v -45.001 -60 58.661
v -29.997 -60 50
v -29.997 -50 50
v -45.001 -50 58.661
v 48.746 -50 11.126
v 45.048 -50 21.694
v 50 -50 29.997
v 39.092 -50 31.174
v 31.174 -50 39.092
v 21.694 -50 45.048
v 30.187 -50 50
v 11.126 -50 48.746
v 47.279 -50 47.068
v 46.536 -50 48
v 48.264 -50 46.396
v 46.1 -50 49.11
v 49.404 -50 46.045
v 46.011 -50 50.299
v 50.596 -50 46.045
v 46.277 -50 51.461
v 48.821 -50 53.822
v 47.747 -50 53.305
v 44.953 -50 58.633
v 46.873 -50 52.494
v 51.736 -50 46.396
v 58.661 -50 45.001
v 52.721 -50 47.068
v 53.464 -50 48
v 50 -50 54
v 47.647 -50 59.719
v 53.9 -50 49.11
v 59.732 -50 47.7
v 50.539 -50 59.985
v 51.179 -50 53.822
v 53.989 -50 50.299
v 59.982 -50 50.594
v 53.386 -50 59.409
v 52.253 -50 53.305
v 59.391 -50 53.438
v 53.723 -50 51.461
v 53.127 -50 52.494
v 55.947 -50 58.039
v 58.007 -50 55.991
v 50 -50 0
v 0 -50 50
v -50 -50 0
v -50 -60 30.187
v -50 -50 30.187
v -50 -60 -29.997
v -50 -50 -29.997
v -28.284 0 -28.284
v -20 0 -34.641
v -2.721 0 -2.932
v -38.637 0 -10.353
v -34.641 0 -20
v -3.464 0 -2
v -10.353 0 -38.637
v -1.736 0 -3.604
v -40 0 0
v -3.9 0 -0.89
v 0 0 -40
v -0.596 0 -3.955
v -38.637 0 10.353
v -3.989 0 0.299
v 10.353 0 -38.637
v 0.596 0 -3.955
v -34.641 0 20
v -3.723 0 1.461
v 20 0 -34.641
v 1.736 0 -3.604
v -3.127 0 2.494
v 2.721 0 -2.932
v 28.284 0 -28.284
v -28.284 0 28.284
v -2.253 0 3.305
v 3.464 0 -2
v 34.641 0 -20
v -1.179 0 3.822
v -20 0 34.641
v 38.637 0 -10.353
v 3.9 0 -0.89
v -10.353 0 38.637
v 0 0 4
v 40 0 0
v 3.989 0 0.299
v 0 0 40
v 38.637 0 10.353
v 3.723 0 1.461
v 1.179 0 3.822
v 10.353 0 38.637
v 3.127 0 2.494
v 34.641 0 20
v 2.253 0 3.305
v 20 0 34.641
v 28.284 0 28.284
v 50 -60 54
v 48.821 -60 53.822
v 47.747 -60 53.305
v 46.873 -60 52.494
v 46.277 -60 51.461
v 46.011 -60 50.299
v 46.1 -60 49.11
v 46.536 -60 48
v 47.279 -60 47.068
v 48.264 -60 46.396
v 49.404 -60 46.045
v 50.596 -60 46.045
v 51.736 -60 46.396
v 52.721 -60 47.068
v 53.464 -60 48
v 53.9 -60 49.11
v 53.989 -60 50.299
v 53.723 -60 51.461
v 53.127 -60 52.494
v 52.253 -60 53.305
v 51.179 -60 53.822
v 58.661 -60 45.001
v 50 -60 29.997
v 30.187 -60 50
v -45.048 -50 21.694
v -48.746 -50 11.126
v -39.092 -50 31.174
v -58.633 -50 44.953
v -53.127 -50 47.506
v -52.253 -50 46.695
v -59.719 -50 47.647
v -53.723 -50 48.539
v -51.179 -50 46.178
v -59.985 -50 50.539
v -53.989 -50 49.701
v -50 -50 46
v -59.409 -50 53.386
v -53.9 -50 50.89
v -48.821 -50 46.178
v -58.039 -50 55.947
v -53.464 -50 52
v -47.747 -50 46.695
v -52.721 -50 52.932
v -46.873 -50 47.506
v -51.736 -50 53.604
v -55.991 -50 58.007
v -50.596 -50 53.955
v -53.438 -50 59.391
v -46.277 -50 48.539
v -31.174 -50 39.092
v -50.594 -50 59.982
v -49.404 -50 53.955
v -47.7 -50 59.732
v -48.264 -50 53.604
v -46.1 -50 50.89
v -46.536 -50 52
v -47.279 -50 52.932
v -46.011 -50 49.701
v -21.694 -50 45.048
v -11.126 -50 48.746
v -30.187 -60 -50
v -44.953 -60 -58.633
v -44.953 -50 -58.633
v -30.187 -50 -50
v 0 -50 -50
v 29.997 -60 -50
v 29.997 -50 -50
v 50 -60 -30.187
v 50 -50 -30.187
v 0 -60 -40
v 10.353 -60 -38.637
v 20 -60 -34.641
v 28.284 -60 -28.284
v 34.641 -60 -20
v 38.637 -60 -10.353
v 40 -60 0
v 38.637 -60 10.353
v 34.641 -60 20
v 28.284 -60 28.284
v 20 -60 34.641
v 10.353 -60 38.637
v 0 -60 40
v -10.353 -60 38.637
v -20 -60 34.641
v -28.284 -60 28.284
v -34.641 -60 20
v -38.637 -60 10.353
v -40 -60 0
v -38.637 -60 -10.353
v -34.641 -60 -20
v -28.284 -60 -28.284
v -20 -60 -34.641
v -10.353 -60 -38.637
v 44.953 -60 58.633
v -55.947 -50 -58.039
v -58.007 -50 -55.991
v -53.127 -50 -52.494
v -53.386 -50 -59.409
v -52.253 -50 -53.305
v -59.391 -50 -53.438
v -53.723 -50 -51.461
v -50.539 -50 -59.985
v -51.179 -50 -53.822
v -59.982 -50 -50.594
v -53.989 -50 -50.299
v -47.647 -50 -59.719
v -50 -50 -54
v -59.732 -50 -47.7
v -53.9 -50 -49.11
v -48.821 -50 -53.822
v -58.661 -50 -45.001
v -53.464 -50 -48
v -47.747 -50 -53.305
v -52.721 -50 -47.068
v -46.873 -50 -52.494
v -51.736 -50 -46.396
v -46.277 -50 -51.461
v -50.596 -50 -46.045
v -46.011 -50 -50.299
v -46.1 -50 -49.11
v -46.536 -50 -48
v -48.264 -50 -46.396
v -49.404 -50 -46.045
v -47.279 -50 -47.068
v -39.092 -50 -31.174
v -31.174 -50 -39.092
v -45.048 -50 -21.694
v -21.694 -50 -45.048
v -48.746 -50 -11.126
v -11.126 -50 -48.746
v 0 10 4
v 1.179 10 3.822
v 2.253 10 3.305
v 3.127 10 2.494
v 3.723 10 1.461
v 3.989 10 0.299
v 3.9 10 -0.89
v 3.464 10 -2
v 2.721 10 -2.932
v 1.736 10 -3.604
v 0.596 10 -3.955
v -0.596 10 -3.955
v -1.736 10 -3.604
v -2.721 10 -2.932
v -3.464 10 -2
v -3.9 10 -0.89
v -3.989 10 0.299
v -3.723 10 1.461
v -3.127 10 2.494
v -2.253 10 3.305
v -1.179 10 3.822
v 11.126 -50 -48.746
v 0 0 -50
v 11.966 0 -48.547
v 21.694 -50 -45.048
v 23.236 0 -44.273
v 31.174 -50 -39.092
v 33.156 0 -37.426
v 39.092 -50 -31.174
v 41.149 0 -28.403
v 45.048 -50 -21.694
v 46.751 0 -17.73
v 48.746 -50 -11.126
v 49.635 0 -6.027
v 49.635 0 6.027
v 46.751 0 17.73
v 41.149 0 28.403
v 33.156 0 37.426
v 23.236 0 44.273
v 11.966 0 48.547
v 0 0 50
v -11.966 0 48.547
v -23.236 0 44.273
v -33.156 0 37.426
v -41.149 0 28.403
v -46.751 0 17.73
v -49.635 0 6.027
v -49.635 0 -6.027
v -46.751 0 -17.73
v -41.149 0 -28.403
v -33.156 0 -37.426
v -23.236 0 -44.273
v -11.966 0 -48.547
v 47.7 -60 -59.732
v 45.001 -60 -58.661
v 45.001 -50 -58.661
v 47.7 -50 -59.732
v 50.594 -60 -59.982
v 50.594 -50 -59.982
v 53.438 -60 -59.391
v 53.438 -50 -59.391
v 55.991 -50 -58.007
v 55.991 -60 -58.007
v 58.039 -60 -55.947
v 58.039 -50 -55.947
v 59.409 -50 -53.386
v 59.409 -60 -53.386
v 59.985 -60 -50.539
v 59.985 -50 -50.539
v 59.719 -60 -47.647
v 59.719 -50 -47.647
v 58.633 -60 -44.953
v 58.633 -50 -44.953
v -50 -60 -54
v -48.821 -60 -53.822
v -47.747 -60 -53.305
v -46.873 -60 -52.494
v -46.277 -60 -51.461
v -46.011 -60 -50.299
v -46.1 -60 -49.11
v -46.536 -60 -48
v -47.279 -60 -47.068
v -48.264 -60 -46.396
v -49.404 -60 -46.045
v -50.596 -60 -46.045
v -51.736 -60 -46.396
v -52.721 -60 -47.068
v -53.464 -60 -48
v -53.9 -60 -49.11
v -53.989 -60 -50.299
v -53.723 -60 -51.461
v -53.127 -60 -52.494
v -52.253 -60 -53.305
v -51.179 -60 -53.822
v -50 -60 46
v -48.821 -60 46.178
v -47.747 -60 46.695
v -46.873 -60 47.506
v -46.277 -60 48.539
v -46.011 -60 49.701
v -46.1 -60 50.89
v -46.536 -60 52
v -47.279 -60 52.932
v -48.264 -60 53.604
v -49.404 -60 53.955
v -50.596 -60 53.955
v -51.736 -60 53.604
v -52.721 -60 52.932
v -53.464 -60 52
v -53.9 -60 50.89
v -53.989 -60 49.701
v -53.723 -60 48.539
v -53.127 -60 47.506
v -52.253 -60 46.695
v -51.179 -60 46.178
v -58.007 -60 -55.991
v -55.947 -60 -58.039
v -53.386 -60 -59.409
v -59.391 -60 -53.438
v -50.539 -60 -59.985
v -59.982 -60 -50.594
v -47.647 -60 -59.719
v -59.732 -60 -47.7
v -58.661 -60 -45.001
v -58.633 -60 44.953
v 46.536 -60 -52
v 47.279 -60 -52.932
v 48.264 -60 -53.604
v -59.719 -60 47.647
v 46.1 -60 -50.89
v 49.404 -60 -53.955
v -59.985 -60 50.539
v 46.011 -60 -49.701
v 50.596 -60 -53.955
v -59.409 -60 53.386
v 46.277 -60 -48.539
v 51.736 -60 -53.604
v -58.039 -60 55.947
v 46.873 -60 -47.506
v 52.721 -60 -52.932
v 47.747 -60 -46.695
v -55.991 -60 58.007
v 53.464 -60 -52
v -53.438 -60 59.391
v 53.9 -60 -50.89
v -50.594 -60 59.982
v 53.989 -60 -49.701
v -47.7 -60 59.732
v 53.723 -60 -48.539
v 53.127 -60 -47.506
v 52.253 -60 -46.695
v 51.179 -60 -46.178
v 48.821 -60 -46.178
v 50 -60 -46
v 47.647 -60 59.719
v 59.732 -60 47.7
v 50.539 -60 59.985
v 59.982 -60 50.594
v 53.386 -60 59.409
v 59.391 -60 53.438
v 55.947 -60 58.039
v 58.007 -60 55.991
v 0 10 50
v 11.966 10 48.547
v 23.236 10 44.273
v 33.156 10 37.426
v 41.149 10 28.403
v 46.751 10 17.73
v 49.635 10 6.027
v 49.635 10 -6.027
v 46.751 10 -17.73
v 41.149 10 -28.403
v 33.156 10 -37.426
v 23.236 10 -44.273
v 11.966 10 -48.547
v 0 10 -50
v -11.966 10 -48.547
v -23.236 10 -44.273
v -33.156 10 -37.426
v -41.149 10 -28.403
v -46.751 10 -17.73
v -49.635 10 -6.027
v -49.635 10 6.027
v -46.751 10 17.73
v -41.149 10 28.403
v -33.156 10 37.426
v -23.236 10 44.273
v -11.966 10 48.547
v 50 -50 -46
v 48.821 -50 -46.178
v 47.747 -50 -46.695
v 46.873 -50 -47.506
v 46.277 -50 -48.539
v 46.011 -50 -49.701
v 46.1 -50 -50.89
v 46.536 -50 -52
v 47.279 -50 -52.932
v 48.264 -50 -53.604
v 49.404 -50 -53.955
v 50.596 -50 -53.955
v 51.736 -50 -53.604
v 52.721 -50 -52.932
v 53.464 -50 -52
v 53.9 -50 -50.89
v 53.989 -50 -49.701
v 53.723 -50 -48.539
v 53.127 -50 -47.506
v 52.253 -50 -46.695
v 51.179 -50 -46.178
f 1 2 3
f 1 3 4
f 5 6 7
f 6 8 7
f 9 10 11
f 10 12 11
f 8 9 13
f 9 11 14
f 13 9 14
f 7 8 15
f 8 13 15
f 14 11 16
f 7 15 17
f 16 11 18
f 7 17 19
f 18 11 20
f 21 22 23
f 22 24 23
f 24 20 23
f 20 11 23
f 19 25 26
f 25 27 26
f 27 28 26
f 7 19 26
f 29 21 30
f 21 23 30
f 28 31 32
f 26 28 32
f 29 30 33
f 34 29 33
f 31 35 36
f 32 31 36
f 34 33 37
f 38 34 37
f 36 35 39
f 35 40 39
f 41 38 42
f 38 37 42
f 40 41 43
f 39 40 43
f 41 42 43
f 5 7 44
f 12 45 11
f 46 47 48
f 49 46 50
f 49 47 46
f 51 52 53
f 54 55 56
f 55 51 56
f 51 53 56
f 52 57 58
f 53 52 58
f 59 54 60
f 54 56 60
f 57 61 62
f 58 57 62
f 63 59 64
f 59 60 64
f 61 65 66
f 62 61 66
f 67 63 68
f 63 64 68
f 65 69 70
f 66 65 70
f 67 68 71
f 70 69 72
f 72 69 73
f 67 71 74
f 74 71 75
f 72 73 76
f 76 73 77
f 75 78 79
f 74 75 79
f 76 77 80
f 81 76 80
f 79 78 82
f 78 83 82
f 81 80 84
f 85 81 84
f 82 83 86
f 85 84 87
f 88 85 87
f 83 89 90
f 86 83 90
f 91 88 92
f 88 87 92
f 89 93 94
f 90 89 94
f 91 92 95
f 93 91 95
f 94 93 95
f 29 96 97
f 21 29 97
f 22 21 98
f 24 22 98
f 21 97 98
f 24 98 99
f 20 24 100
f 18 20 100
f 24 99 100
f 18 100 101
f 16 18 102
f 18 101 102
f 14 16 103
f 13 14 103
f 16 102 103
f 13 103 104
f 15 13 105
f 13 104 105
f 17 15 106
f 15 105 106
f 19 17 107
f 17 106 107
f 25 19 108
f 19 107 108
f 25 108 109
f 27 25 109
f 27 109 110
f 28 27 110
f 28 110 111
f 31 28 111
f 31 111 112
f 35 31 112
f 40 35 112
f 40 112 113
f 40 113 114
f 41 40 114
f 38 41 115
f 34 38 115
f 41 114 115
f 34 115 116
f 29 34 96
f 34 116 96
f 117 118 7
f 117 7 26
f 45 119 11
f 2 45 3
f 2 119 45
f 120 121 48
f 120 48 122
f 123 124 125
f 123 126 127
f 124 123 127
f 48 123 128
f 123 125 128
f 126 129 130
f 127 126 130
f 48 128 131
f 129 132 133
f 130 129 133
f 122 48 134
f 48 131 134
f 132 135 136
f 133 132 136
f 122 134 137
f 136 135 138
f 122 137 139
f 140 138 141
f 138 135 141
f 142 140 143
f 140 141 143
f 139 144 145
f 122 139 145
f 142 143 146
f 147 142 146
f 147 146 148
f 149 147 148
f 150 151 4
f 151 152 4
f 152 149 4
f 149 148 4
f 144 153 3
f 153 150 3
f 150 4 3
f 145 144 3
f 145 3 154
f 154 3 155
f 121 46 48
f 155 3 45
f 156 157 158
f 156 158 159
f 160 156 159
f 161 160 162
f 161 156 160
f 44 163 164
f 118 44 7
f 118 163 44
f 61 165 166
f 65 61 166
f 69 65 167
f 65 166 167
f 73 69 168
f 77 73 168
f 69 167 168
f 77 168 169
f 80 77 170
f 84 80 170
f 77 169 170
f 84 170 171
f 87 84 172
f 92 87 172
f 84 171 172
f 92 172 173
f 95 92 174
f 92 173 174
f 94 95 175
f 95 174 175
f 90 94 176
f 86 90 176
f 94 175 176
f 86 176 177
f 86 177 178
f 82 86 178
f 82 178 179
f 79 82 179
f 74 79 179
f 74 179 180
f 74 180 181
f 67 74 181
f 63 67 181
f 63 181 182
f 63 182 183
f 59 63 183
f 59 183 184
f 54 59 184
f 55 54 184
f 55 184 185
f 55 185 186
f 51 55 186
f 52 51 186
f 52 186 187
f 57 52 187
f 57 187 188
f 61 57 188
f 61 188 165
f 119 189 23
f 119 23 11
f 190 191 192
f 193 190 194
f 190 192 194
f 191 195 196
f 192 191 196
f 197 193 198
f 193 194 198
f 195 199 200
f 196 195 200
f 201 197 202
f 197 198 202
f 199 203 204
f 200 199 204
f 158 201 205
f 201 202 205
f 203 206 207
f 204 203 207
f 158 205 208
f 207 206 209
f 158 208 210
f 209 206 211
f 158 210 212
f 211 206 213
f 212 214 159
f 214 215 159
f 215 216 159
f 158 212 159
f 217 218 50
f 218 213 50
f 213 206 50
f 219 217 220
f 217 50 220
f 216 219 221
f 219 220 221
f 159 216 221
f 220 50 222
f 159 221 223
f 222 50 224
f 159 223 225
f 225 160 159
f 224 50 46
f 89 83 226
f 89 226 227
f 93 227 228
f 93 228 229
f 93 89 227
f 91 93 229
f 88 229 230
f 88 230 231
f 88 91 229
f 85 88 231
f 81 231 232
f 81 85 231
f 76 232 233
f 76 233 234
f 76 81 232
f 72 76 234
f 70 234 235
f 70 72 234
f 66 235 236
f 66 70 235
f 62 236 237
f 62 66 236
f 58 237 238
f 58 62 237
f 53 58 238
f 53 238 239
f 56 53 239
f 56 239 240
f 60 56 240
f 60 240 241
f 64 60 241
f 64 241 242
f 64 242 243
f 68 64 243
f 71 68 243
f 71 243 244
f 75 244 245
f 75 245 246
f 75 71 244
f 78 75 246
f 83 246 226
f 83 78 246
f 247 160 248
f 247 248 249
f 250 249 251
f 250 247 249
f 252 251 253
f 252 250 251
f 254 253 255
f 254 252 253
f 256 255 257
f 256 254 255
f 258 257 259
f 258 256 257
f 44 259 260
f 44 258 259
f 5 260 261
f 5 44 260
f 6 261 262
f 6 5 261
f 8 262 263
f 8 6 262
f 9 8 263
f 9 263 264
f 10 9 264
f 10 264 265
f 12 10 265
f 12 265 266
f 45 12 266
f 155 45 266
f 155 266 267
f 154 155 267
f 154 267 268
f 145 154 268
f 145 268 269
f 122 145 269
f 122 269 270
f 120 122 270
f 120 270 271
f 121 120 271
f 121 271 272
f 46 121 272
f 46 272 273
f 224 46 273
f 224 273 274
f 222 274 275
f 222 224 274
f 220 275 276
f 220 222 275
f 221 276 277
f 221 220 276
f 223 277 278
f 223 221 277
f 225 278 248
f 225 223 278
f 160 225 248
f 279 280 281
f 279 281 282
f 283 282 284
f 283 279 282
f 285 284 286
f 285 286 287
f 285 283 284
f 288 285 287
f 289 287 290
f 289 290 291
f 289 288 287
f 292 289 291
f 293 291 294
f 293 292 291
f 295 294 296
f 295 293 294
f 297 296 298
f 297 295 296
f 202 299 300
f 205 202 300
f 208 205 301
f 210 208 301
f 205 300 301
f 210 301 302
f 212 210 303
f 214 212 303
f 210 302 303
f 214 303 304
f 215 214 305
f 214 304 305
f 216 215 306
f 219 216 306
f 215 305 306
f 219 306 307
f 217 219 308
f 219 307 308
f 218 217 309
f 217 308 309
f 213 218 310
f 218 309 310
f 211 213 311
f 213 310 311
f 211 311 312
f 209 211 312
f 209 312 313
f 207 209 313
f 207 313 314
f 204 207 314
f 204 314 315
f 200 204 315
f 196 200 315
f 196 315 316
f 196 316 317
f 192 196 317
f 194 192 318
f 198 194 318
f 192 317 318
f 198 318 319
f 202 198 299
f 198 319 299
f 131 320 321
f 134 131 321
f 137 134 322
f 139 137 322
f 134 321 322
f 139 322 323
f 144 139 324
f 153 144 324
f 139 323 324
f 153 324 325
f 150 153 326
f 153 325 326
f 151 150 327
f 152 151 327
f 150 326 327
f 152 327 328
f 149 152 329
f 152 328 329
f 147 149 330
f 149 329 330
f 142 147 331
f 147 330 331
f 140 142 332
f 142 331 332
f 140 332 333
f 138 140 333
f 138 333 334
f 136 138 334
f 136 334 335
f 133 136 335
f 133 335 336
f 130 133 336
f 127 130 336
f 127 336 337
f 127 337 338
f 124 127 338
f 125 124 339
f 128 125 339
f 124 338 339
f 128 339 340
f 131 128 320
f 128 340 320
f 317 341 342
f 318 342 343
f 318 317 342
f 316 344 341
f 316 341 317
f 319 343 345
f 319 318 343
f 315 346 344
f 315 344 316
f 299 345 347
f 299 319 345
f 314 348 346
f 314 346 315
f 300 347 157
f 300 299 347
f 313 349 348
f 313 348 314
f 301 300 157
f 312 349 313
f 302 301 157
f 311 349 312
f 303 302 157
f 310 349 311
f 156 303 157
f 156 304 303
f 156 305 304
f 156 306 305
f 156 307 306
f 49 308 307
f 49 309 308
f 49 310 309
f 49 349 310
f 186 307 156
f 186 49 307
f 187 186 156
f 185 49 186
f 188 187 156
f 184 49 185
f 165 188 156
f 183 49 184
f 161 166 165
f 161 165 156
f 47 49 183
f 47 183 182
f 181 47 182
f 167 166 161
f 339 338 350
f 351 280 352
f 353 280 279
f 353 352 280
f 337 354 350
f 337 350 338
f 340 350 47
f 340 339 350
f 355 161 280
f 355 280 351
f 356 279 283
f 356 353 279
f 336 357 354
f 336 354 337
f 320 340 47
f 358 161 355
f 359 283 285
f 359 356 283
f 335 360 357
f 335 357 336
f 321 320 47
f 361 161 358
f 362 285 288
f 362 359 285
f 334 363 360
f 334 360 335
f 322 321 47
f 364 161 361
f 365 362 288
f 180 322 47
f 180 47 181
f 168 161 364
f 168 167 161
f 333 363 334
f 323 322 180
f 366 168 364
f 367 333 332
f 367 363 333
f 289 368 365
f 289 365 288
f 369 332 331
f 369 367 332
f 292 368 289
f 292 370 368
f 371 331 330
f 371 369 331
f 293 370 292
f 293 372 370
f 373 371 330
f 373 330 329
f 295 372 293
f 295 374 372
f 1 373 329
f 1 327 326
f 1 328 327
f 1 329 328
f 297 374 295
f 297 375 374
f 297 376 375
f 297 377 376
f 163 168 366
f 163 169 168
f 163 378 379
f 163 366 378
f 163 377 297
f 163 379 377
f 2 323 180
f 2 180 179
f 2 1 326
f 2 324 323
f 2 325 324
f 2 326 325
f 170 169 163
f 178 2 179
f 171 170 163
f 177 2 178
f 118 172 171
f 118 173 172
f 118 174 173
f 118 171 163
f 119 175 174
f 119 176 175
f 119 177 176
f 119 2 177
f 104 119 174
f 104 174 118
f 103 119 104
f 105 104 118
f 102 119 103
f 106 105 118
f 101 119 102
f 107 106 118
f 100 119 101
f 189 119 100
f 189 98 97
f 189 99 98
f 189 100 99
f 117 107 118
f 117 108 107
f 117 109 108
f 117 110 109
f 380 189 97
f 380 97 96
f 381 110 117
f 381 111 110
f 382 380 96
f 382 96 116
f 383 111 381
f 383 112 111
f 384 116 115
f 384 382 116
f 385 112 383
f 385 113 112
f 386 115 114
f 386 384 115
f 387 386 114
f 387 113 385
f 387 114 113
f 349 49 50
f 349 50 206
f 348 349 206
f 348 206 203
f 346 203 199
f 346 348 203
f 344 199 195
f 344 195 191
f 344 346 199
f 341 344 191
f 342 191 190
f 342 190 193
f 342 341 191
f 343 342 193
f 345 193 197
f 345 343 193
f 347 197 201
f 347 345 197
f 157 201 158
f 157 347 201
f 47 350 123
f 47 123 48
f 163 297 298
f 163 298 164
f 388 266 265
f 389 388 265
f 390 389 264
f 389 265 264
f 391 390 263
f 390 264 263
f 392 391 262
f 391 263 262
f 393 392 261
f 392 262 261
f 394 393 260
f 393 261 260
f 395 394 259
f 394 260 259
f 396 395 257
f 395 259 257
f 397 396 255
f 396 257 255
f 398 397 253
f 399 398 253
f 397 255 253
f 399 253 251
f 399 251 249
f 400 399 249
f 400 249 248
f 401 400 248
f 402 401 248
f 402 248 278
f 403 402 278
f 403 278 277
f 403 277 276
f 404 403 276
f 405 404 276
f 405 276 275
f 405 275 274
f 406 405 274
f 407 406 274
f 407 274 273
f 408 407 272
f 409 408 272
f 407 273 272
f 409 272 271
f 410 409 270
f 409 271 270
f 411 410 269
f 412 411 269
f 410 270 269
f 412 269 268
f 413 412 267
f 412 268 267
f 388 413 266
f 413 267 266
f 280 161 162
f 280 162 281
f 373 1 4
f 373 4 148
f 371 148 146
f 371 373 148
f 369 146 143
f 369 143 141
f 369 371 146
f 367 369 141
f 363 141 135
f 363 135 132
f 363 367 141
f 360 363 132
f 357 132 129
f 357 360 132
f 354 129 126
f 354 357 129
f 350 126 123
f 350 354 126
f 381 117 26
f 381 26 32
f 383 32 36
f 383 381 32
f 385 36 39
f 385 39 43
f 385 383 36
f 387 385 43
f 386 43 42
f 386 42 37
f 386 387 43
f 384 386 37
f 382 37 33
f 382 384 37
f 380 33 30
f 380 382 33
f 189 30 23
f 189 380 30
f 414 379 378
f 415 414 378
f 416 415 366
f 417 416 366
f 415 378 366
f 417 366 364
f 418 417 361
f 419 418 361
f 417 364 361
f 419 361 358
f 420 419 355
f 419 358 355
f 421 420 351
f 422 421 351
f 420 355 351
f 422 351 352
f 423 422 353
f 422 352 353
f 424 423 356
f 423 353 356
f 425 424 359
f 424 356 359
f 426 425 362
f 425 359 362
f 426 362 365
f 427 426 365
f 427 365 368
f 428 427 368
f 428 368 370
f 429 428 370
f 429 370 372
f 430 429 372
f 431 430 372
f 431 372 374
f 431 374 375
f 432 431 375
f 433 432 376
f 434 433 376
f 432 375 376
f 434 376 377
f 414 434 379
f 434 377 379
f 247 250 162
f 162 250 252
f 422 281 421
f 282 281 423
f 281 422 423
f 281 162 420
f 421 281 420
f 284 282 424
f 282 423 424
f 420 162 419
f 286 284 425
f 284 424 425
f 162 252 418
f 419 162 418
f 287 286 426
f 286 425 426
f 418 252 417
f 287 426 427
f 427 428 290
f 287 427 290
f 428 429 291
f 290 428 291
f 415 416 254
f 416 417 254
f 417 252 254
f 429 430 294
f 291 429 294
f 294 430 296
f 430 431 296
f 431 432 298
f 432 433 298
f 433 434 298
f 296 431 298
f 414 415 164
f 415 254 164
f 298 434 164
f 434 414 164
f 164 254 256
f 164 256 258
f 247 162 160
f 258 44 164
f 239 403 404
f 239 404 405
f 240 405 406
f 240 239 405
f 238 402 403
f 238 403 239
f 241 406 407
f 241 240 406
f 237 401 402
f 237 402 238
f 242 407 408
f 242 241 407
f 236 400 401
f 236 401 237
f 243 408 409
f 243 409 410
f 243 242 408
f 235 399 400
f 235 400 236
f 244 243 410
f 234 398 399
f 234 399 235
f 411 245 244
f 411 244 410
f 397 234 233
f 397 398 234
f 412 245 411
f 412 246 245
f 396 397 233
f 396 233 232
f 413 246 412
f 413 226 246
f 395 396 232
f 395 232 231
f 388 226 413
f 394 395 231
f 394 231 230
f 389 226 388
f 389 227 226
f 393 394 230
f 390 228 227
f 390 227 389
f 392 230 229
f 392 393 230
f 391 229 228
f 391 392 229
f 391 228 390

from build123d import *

# Parameters (mm, degrees)
SKETCH1_R           = 50
SKETCH1_R_2         = 4
BOSS_EXTRUDE1_DEPTH = 10
BOSS_EXTRUDE2_START = 50
SKETCH2_R           = 50
SKETCH2_R_2         = 40
BOSS_EXTRUDE2_DEPTH = 50
BOSS_EXTRUDE3_START = 10
SKETCH4_R           = 4
SKETCH4_R_2         = 40
BOSS_EXTRUDE3_DEPTH = 10


with BuildPart() as part:
    # Sketch1 → Boss-Extrude1 (new body)
    with BuildSketch(Plane(origin=(0, 0, 0), x_dir=(1, 0, 0), z_dir=(0, 1, 0))):
        with Locations(Location((0, 0, 0), (0, 0, 270))):
            Circle(SKETCH1_R)
        with Locations(Location((0, 0, 0), (0, 0, 270))):
            Circle(SKETCH1_R_2, mode=Mode.SUBTRACT)
    extrude(amount=BOSS_EXTRUDE1_DEPTH)

    # Sketch2 → Boss-Extrude2 (add)
    with BuildSketch(Plane.XZ.offset(BOSS_EXTRUDE2_START)):
        with Locations(Location((0, 0, 0), (0, 0, 270))):
            Circle(SKETCH2_R)
        with Locations(Location((0, 0, 0), (0, 0, 270))):
            Circle(SKETCH2_R_2, mode=Mode.SUBTRACT)
    extrude(amount=-BOSS_EXTRUDE2_DEPTH)

    # Sketch4 → Boss-Extrude3 (add)
    with BuildSketch(Plane.XZ.offset(50).offset(BOSS_EXTRUDE3_START)):
        with BuildLine():
            Line((-30.18665216, -50), (29.99743133, -50))
            Line((29.99743133, -50), (45.000642085, -58.660624714))
            ThreePointArc((45.000642085, -58.660624714), (57.090562914, -57.051518812), (58.632887989, -44.95289737))
            Line((58.632887989, -44.95289737), (50, -30.18665216))
            Line((50, -30.18665216), (50, 29.99743133))
            Line((50, 29.99743133), (58.660624714, 45.000642085))
            ThreePointArc((58.660624714, 45.000642085), (57.051518812, 57.090562914), (44.95289737, 58.632887989))
            Line((44.95289737, 58.632887989), (30.18665216, 50))
            Line((30.18665216, 50), (-29.99743133, 50))
            Line((-29.99743133, 50), (-45.000642085, 58.660624714))
            ThreePointArc((-45.000642085, 58.660624714), (-57.090562914, 57.051518812), (-58.632887989, 44.95289737))
            Line((-58.632887989, 44.95289737), (-50, 30.18665216))
            Line((-50, 30.18665216), (-50, -29.99743133))
            Line((-50, -29.99743133), (-58.660624714, -45.000642085))
            ThreePointArc((-58.660624714, -45.000642085), (-57.051518812, -57.090562914), (-44.95289737, -58.632887989))
            Line((-44.95289737, -58.632887989), (-30.18665216, -50))
        make_face()
        with Locations(Location((-50, 50, 0), (0, 0, 270))):
            Circle(SKETCH4_R, mode=Mode.SUBTRACT)
        with Locations(Location((-50, -50, 0), (0, 0, 270))):
            Circle(SKETCH4_R, mode=Mode.SUBTRACT)
        with Locations(Location((50, -50, 0), (0, 0, 90))):
            Circle(SKETCH4_R, mode=Mode.SUBTRACT)
        with Locations(Location((50, 50, 0), (0, 0, 90))):
            Circle(SKETCH4_R, mode=Mode.SUBTRACT)
        with Locations(Location((0, 0, 0), (0, 0, 270))):
            Circle(SKETCH4_R_2, mode=Mode.SUBTRACT)
    extrude(amount=-BOSS_EXTRUDE3_DEPTH)


solid = part.part
